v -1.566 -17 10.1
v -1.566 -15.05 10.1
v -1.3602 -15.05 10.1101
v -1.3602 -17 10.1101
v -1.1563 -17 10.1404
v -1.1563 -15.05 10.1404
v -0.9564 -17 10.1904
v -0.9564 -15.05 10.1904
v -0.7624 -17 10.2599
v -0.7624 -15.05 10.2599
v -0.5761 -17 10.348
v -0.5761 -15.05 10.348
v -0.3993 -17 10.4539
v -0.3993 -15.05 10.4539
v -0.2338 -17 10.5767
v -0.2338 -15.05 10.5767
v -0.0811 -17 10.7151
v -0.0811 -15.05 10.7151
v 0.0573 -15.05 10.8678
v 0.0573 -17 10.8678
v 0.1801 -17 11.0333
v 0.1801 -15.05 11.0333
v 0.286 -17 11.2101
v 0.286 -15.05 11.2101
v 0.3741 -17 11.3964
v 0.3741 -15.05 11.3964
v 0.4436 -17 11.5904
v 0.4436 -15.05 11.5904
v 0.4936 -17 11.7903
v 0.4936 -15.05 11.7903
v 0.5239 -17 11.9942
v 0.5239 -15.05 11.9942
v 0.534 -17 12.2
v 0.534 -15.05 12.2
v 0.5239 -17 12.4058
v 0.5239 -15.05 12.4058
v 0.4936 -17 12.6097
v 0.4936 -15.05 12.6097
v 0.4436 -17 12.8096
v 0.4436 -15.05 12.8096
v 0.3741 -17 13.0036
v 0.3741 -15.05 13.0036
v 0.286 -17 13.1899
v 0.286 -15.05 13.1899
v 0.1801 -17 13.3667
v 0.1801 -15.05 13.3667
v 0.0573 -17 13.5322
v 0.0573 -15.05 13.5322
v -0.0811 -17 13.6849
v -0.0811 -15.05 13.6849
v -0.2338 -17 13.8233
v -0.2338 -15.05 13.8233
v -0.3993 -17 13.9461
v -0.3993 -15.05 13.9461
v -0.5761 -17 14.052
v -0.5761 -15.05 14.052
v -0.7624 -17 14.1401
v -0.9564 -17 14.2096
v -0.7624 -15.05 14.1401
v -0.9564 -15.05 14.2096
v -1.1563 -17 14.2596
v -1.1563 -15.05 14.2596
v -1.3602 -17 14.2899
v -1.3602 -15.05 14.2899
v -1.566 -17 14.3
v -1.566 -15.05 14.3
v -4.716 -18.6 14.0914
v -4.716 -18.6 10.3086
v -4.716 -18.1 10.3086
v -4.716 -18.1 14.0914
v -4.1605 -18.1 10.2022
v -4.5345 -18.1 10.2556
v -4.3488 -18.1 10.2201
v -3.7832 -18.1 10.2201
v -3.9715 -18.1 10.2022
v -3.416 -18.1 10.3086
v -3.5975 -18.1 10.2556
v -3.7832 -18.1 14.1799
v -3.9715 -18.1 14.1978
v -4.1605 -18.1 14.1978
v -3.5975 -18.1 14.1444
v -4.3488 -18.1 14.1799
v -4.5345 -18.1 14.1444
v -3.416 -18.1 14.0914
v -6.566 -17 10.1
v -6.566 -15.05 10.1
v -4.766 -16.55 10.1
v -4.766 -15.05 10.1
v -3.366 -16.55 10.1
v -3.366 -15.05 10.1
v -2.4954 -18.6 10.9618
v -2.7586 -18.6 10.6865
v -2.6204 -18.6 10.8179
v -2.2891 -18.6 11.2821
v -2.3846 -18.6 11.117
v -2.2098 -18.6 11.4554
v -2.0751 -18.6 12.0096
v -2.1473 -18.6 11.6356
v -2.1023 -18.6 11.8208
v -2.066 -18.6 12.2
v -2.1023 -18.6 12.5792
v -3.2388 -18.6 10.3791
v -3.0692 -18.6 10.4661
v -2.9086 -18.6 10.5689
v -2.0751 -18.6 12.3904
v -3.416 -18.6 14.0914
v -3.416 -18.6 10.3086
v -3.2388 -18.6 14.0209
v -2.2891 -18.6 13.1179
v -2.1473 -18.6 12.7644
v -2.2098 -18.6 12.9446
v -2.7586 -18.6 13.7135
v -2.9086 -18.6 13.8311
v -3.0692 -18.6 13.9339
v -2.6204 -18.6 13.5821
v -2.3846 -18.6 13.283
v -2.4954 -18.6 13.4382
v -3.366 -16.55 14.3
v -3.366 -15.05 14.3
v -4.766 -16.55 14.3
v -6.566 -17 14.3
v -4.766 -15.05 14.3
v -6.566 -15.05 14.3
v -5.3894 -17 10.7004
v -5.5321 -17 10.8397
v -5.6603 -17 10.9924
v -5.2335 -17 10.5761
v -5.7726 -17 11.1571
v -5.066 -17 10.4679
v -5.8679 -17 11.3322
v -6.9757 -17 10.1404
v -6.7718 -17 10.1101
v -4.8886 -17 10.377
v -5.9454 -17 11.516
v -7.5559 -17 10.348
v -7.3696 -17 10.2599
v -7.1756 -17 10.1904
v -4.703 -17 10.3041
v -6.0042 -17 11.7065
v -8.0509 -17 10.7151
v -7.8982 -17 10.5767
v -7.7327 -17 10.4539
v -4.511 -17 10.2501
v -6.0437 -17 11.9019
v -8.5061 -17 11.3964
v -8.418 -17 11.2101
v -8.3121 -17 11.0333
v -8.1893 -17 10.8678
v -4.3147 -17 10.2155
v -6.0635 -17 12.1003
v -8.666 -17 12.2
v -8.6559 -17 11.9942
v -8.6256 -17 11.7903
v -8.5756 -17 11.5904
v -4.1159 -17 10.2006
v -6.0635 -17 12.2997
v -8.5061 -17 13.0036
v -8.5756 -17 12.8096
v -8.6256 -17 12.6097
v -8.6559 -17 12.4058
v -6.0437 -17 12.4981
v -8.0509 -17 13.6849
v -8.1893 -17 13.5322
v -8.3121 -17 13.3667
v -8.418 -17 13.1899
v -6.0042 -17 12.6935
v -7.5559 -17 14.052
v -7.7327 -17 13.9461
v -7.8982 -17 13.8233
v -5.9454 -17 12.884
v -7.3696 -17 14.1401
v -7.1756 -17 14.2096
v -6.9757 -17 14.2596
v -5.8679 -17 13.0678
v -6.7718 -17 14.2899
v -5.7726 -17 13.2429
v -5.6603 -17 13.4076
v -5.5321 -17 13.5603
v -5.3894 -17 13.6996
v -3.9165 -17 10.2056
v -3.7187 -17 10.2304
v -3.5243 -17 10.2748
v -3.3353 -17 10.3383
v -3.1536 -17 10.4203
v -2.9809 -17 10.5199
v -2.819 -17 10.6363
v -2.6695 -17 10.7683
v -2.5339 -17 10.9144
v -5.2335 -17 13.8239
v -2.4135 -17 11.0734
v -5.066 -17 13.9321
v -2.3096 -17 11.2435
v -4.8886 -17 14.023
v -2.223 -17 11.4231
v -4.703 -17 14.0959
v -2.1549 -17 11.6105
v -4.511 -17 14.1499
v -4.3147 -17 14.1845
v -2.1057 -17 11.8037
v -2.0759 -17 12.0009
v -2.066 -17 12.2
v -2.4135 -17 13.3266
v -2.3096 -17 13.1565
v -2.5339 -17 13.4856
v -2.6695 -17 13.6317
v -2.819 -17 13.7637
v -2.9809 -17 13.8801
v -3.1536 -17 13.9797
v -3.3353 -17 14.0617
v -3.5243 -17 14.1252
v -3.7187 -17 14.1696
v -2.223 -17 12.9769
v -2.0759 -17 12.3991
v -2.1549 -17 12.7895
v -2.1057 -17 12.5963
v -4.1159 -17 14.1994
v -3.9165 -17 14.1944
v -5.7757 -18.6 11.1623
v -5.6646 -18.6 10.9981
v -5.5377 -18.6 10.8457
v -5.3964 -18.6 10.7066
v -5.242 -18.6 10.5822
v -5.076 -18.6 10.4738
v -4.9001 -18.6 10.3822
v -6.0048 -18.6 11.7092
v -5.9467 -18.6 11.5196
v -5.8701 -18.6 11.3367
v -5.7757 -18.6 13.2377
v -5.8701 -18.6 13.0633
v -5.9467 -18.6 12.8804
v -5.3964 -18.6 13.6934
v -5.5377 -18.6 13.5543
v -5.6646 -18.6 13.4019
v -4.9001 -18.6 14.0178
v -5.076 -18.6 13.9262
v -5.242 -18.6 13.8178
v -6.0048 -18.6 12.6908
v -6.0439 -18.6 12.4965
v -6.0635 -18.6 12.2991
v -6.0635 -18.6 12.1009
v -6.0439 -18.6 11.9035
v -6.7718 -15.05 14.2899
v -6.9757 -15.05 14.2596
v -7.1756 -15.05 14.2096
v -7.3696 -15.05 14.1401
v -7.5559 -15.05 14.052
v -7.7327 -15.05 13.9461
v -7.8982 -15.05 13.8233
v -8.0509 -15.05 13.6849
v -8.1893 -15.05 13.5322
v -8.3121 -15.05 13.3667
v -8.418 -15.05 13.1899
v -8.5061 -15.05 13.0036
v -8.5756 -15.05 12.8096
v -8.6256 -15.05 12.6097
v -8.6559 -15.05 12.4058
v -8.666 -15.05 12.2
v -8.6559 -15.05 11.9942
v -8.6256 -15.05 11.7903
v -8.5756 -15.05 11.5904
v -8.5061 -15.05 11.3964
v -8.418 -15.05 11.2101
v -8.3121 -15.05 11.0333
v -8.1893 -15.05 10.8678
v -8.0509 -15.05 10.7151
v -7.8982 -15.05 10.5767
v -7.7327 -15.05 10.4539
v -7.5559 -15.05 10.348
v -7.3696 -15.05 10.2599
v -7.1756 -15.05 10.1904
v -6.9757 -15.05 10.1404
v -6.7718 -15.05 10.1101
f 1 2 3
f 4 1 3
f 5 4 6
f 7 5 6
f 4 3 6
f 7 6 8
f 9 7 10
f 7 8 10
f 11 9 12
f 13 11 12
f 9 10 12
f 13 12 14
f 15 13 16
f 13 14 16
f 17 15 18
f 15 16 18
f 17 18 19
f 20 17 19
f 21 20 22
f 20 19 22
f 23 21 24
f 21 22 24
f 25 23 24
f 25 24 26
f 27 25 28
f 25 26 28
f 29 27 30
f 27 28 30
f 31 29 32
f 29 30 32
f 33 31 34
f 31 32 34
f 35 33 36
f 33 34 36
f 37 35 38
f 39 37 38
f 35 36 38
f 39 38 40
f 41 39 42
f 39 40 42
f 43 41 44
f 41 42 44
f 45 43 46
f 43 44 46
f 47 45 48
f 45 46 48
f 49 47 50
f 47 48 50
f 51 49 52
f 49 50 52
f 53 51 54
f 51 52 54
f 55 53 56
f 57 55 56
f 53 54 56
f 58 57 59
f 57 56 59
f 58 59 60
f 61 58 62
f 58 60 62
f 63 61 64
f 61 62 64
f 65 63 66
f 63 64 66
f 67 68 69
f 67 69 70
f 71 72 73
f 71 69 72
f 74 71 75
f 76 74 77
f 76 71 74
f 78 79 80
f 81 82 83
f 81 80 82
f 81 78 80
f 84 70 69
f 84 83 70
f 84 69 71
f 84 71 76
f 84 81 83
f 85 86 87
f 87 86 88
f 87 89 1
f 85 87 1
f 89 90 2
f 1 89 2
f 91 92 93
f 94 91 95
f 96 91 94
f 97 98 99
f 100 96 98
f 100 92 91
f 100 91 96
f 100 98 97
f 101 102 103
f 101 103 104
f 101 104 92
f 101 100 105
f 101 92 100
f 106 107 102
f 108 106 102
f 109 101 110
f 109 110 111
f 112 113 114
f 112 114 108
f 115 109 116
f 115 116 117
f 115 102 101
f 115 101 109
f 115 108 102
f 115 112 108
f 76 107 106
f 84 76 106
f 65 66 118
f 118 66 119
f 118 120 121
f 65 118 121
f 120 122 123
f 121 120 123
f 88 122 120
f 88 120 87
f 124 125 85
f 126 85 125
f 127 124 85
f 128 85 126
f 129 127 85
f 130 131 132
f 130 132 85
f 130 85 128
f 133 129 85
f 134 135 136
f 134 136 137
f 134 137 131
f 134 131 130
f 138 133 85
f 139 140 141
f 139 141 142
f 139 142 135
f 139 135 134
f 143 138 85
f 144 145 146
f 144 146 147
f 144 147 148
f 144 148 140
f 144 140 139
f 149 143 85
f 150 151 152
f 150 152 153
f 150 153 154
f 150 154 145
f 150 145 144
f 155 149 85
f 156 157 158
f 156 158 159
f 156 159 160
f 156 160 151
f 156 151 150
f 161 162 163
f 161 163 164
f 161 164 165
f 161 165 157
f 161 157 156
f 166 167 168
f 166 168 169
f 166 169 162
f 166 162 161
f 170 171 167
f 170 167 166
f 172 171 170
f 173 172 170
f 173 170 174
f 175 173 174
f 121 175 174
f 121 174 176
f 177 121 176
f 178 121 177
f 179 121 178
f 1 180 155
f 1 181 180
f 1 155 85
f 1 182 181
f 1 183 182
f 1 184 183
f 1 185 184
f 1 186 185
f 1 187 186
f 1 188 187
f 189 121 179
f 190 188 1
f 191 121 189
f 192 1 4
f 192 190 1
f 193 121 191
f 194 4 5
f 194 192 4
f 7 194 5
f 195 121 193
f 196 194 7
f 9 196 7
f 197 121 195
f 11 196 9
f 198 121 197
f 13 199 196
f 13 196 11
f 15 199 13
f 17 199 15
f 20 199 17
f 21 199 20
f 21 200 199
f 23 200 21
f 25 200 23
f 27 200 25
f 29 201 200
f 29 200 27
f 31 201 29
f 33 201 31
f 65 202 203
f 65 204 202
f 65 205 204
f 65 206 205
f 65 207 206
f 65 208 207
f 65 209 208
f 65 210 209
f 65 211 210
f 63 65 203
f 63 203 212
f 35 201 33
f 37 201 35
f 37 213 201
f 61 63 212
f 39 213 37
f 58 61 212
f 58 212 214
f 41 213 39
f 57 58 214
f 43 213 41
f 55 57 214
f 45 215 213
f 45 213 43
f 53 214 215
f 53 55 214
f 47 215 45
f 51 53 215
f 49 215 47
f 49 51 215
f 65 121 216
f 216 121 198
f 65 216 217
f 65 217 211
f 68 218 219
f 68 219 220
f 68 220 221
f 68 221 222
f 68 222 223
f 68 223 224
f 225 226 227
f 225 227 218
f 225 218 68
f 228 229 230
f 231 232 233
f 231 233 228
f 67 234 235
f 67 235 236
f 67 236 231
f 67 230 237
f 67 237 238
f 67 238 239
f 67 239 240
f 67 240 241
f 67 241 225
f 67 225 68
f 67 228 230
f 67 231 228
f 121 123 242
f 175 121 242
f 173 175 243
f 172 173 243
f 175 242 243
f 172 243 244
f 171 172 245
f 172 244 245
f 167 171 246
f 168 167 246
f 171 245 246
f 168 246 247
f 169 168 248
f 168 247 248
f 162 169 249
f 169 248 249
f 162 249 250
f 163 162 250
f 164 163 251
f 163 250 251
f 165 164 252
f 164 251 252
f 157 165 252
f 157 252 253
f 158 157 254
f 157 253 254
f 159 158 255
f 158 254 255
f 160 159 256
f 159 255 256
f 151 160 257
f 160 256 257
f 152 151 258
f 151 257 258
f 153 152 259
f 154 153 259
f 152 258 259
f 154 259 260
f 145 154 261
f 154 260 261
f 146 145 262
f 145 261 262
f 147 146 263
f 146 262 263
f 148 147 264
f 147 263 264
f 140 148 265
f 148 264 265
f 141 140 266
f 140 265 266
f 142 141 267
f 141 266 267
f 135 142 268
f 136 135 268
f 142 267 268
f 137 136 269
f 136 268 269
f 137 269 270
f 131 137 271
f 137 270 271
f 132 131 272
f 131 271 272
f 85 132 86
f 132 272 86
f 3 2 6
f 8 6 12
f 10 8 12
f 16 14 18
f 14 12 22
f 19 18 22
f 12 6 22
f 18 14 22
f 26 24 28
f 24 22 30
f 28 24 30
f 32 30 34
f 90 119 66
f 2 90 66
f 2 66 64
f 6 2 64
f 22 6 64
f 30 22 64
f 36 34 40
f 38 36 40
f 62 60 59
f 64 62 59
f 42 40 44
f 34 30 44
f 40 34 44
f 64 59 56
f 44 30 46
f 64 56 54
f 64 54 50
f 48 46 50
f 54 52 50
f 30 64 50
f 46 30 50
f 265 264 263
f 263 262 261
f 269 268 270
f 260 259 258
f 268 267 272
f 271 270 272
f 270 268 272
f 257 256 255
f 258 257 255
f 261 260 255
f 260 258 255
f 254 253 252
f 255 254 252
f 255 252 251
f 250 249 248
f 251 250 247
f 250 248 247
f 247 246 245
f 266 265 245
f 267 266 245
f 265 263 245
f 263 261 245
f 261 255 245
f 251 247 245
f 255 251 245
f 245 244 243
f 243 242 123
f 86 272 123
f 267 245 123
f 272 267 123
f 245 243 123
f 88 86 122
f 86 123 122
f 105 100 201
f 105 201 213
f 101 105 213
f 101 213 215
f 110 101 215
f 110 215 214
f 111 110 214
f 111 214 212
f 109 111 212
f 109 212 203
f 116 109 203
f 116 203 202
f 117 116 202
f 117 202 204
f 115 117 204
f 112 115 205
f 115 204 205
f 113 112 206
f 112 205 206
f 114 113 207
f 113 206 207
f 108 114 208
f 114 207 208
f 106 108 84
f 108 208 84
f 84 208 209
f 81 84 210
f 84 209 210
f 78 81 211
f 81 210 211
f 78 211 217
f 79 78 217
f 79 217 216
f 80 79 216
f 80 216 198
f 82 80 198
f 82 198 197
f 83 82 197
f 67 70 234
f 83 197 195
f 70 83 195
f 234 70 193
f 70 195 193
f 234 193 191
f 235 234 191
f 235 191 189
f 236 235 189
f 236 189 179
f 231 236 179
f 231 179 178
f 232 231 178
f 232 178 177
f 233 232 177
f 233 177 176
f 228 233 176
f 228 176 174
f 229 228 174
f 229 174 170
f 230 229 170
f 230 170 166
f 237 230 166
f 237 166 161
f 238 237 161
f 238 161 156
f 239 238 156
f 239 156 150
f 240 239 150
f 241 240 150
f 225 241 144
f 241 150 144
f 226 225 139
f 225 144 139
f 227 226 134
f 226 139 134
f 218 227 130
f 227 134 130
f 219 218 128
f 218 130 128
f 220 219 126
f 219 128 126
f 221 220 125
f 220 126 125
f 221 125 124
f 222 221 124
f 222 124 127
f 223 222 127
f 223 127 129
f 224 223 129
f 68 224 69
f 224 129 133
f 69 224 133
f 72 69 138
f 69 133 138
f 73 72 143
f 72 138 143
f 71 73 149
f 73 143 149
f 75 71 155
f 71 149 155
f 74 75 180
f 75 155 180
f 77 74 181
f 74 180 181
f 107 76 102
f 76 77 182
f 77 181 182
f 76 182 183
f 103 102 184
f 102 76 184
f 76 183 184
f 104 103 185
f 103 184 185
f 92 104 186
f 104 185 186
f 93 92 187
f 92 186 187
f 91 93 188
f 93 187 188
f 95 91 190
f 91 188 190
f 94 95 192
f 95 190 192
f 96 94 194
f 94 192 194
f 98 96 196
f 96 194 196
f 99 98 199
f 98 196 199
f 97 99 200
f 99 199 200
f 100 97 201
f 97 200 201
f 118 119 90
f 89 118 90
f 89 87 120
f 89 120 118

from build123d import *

# Parameters (mm, degrees)
PAD002_DEPTH    = 1.95
SKETCH008_R     = 2
PAD003_DEPTH    = 1.6
SKETCH009_W     = 1.4
SKETCH009_H     = 4.2
POCKET005_DEPTH = 1.5
SKETCH010_W     = 1.3
SKETCH010_H     = 4
POCKET006_DEPTH = 0.5


with BuildPart() as part:
    # Sketch007 → Pad002 (new body)
    with BuildSketch(Plane.XZ):
        with BuildLine():
            ThreePointArc((-2.5, 2.1), (-4.6, 0), (-2.5, -2.1))
            Line((-2.5, -2.1), (2.5, -2.1))
            ThreePointArc((2.5, -2.1), (4.6, 0), (2.5, 2.1))
            Line((2.5, 2.1), (-2.5, 2.1))
        make_face()
    extrude(amount=PAD002_DEPTH)

    # Sketch008 (on Face6 of Pad002) → Pad003 (join)
    with BuildSketch(Plane.XZ.offset(1.95)):
        Circle(SKETCH008_R)
    extrude(amount=PAD003_DEPTH)

    # Sketch009 (on Face4 of Pad003) → Pocket005 (cut)
    with BuildSketch(Plane(origin=(0, 0, 0), x_dir=(1, 0, 0), z_dir=(0, 1, 0))):
        Rectangle(SKETCH009_W, SKETCH009_H)
    extrude(amount=-POCKET005_DEPTH, mode=Mode.SUBTRACT)

    # Sketch010 (on Face12 of Pocket005) → Pocket006 (cut)
    with BuildSketch(Plane.XZ.offset(3.55)):
        Rectangle(SKETCH010_W, SKETCH010_H)
    extrude(amount=-POCKET006_DEPTH, mode=Mode.SUBTRACT)


with BuildPart() as part_1:
    # Body001 placement: moved
    add(part.part.moved(Location((-4.066, -15.05, 12.2))))


solid = part_1.part
